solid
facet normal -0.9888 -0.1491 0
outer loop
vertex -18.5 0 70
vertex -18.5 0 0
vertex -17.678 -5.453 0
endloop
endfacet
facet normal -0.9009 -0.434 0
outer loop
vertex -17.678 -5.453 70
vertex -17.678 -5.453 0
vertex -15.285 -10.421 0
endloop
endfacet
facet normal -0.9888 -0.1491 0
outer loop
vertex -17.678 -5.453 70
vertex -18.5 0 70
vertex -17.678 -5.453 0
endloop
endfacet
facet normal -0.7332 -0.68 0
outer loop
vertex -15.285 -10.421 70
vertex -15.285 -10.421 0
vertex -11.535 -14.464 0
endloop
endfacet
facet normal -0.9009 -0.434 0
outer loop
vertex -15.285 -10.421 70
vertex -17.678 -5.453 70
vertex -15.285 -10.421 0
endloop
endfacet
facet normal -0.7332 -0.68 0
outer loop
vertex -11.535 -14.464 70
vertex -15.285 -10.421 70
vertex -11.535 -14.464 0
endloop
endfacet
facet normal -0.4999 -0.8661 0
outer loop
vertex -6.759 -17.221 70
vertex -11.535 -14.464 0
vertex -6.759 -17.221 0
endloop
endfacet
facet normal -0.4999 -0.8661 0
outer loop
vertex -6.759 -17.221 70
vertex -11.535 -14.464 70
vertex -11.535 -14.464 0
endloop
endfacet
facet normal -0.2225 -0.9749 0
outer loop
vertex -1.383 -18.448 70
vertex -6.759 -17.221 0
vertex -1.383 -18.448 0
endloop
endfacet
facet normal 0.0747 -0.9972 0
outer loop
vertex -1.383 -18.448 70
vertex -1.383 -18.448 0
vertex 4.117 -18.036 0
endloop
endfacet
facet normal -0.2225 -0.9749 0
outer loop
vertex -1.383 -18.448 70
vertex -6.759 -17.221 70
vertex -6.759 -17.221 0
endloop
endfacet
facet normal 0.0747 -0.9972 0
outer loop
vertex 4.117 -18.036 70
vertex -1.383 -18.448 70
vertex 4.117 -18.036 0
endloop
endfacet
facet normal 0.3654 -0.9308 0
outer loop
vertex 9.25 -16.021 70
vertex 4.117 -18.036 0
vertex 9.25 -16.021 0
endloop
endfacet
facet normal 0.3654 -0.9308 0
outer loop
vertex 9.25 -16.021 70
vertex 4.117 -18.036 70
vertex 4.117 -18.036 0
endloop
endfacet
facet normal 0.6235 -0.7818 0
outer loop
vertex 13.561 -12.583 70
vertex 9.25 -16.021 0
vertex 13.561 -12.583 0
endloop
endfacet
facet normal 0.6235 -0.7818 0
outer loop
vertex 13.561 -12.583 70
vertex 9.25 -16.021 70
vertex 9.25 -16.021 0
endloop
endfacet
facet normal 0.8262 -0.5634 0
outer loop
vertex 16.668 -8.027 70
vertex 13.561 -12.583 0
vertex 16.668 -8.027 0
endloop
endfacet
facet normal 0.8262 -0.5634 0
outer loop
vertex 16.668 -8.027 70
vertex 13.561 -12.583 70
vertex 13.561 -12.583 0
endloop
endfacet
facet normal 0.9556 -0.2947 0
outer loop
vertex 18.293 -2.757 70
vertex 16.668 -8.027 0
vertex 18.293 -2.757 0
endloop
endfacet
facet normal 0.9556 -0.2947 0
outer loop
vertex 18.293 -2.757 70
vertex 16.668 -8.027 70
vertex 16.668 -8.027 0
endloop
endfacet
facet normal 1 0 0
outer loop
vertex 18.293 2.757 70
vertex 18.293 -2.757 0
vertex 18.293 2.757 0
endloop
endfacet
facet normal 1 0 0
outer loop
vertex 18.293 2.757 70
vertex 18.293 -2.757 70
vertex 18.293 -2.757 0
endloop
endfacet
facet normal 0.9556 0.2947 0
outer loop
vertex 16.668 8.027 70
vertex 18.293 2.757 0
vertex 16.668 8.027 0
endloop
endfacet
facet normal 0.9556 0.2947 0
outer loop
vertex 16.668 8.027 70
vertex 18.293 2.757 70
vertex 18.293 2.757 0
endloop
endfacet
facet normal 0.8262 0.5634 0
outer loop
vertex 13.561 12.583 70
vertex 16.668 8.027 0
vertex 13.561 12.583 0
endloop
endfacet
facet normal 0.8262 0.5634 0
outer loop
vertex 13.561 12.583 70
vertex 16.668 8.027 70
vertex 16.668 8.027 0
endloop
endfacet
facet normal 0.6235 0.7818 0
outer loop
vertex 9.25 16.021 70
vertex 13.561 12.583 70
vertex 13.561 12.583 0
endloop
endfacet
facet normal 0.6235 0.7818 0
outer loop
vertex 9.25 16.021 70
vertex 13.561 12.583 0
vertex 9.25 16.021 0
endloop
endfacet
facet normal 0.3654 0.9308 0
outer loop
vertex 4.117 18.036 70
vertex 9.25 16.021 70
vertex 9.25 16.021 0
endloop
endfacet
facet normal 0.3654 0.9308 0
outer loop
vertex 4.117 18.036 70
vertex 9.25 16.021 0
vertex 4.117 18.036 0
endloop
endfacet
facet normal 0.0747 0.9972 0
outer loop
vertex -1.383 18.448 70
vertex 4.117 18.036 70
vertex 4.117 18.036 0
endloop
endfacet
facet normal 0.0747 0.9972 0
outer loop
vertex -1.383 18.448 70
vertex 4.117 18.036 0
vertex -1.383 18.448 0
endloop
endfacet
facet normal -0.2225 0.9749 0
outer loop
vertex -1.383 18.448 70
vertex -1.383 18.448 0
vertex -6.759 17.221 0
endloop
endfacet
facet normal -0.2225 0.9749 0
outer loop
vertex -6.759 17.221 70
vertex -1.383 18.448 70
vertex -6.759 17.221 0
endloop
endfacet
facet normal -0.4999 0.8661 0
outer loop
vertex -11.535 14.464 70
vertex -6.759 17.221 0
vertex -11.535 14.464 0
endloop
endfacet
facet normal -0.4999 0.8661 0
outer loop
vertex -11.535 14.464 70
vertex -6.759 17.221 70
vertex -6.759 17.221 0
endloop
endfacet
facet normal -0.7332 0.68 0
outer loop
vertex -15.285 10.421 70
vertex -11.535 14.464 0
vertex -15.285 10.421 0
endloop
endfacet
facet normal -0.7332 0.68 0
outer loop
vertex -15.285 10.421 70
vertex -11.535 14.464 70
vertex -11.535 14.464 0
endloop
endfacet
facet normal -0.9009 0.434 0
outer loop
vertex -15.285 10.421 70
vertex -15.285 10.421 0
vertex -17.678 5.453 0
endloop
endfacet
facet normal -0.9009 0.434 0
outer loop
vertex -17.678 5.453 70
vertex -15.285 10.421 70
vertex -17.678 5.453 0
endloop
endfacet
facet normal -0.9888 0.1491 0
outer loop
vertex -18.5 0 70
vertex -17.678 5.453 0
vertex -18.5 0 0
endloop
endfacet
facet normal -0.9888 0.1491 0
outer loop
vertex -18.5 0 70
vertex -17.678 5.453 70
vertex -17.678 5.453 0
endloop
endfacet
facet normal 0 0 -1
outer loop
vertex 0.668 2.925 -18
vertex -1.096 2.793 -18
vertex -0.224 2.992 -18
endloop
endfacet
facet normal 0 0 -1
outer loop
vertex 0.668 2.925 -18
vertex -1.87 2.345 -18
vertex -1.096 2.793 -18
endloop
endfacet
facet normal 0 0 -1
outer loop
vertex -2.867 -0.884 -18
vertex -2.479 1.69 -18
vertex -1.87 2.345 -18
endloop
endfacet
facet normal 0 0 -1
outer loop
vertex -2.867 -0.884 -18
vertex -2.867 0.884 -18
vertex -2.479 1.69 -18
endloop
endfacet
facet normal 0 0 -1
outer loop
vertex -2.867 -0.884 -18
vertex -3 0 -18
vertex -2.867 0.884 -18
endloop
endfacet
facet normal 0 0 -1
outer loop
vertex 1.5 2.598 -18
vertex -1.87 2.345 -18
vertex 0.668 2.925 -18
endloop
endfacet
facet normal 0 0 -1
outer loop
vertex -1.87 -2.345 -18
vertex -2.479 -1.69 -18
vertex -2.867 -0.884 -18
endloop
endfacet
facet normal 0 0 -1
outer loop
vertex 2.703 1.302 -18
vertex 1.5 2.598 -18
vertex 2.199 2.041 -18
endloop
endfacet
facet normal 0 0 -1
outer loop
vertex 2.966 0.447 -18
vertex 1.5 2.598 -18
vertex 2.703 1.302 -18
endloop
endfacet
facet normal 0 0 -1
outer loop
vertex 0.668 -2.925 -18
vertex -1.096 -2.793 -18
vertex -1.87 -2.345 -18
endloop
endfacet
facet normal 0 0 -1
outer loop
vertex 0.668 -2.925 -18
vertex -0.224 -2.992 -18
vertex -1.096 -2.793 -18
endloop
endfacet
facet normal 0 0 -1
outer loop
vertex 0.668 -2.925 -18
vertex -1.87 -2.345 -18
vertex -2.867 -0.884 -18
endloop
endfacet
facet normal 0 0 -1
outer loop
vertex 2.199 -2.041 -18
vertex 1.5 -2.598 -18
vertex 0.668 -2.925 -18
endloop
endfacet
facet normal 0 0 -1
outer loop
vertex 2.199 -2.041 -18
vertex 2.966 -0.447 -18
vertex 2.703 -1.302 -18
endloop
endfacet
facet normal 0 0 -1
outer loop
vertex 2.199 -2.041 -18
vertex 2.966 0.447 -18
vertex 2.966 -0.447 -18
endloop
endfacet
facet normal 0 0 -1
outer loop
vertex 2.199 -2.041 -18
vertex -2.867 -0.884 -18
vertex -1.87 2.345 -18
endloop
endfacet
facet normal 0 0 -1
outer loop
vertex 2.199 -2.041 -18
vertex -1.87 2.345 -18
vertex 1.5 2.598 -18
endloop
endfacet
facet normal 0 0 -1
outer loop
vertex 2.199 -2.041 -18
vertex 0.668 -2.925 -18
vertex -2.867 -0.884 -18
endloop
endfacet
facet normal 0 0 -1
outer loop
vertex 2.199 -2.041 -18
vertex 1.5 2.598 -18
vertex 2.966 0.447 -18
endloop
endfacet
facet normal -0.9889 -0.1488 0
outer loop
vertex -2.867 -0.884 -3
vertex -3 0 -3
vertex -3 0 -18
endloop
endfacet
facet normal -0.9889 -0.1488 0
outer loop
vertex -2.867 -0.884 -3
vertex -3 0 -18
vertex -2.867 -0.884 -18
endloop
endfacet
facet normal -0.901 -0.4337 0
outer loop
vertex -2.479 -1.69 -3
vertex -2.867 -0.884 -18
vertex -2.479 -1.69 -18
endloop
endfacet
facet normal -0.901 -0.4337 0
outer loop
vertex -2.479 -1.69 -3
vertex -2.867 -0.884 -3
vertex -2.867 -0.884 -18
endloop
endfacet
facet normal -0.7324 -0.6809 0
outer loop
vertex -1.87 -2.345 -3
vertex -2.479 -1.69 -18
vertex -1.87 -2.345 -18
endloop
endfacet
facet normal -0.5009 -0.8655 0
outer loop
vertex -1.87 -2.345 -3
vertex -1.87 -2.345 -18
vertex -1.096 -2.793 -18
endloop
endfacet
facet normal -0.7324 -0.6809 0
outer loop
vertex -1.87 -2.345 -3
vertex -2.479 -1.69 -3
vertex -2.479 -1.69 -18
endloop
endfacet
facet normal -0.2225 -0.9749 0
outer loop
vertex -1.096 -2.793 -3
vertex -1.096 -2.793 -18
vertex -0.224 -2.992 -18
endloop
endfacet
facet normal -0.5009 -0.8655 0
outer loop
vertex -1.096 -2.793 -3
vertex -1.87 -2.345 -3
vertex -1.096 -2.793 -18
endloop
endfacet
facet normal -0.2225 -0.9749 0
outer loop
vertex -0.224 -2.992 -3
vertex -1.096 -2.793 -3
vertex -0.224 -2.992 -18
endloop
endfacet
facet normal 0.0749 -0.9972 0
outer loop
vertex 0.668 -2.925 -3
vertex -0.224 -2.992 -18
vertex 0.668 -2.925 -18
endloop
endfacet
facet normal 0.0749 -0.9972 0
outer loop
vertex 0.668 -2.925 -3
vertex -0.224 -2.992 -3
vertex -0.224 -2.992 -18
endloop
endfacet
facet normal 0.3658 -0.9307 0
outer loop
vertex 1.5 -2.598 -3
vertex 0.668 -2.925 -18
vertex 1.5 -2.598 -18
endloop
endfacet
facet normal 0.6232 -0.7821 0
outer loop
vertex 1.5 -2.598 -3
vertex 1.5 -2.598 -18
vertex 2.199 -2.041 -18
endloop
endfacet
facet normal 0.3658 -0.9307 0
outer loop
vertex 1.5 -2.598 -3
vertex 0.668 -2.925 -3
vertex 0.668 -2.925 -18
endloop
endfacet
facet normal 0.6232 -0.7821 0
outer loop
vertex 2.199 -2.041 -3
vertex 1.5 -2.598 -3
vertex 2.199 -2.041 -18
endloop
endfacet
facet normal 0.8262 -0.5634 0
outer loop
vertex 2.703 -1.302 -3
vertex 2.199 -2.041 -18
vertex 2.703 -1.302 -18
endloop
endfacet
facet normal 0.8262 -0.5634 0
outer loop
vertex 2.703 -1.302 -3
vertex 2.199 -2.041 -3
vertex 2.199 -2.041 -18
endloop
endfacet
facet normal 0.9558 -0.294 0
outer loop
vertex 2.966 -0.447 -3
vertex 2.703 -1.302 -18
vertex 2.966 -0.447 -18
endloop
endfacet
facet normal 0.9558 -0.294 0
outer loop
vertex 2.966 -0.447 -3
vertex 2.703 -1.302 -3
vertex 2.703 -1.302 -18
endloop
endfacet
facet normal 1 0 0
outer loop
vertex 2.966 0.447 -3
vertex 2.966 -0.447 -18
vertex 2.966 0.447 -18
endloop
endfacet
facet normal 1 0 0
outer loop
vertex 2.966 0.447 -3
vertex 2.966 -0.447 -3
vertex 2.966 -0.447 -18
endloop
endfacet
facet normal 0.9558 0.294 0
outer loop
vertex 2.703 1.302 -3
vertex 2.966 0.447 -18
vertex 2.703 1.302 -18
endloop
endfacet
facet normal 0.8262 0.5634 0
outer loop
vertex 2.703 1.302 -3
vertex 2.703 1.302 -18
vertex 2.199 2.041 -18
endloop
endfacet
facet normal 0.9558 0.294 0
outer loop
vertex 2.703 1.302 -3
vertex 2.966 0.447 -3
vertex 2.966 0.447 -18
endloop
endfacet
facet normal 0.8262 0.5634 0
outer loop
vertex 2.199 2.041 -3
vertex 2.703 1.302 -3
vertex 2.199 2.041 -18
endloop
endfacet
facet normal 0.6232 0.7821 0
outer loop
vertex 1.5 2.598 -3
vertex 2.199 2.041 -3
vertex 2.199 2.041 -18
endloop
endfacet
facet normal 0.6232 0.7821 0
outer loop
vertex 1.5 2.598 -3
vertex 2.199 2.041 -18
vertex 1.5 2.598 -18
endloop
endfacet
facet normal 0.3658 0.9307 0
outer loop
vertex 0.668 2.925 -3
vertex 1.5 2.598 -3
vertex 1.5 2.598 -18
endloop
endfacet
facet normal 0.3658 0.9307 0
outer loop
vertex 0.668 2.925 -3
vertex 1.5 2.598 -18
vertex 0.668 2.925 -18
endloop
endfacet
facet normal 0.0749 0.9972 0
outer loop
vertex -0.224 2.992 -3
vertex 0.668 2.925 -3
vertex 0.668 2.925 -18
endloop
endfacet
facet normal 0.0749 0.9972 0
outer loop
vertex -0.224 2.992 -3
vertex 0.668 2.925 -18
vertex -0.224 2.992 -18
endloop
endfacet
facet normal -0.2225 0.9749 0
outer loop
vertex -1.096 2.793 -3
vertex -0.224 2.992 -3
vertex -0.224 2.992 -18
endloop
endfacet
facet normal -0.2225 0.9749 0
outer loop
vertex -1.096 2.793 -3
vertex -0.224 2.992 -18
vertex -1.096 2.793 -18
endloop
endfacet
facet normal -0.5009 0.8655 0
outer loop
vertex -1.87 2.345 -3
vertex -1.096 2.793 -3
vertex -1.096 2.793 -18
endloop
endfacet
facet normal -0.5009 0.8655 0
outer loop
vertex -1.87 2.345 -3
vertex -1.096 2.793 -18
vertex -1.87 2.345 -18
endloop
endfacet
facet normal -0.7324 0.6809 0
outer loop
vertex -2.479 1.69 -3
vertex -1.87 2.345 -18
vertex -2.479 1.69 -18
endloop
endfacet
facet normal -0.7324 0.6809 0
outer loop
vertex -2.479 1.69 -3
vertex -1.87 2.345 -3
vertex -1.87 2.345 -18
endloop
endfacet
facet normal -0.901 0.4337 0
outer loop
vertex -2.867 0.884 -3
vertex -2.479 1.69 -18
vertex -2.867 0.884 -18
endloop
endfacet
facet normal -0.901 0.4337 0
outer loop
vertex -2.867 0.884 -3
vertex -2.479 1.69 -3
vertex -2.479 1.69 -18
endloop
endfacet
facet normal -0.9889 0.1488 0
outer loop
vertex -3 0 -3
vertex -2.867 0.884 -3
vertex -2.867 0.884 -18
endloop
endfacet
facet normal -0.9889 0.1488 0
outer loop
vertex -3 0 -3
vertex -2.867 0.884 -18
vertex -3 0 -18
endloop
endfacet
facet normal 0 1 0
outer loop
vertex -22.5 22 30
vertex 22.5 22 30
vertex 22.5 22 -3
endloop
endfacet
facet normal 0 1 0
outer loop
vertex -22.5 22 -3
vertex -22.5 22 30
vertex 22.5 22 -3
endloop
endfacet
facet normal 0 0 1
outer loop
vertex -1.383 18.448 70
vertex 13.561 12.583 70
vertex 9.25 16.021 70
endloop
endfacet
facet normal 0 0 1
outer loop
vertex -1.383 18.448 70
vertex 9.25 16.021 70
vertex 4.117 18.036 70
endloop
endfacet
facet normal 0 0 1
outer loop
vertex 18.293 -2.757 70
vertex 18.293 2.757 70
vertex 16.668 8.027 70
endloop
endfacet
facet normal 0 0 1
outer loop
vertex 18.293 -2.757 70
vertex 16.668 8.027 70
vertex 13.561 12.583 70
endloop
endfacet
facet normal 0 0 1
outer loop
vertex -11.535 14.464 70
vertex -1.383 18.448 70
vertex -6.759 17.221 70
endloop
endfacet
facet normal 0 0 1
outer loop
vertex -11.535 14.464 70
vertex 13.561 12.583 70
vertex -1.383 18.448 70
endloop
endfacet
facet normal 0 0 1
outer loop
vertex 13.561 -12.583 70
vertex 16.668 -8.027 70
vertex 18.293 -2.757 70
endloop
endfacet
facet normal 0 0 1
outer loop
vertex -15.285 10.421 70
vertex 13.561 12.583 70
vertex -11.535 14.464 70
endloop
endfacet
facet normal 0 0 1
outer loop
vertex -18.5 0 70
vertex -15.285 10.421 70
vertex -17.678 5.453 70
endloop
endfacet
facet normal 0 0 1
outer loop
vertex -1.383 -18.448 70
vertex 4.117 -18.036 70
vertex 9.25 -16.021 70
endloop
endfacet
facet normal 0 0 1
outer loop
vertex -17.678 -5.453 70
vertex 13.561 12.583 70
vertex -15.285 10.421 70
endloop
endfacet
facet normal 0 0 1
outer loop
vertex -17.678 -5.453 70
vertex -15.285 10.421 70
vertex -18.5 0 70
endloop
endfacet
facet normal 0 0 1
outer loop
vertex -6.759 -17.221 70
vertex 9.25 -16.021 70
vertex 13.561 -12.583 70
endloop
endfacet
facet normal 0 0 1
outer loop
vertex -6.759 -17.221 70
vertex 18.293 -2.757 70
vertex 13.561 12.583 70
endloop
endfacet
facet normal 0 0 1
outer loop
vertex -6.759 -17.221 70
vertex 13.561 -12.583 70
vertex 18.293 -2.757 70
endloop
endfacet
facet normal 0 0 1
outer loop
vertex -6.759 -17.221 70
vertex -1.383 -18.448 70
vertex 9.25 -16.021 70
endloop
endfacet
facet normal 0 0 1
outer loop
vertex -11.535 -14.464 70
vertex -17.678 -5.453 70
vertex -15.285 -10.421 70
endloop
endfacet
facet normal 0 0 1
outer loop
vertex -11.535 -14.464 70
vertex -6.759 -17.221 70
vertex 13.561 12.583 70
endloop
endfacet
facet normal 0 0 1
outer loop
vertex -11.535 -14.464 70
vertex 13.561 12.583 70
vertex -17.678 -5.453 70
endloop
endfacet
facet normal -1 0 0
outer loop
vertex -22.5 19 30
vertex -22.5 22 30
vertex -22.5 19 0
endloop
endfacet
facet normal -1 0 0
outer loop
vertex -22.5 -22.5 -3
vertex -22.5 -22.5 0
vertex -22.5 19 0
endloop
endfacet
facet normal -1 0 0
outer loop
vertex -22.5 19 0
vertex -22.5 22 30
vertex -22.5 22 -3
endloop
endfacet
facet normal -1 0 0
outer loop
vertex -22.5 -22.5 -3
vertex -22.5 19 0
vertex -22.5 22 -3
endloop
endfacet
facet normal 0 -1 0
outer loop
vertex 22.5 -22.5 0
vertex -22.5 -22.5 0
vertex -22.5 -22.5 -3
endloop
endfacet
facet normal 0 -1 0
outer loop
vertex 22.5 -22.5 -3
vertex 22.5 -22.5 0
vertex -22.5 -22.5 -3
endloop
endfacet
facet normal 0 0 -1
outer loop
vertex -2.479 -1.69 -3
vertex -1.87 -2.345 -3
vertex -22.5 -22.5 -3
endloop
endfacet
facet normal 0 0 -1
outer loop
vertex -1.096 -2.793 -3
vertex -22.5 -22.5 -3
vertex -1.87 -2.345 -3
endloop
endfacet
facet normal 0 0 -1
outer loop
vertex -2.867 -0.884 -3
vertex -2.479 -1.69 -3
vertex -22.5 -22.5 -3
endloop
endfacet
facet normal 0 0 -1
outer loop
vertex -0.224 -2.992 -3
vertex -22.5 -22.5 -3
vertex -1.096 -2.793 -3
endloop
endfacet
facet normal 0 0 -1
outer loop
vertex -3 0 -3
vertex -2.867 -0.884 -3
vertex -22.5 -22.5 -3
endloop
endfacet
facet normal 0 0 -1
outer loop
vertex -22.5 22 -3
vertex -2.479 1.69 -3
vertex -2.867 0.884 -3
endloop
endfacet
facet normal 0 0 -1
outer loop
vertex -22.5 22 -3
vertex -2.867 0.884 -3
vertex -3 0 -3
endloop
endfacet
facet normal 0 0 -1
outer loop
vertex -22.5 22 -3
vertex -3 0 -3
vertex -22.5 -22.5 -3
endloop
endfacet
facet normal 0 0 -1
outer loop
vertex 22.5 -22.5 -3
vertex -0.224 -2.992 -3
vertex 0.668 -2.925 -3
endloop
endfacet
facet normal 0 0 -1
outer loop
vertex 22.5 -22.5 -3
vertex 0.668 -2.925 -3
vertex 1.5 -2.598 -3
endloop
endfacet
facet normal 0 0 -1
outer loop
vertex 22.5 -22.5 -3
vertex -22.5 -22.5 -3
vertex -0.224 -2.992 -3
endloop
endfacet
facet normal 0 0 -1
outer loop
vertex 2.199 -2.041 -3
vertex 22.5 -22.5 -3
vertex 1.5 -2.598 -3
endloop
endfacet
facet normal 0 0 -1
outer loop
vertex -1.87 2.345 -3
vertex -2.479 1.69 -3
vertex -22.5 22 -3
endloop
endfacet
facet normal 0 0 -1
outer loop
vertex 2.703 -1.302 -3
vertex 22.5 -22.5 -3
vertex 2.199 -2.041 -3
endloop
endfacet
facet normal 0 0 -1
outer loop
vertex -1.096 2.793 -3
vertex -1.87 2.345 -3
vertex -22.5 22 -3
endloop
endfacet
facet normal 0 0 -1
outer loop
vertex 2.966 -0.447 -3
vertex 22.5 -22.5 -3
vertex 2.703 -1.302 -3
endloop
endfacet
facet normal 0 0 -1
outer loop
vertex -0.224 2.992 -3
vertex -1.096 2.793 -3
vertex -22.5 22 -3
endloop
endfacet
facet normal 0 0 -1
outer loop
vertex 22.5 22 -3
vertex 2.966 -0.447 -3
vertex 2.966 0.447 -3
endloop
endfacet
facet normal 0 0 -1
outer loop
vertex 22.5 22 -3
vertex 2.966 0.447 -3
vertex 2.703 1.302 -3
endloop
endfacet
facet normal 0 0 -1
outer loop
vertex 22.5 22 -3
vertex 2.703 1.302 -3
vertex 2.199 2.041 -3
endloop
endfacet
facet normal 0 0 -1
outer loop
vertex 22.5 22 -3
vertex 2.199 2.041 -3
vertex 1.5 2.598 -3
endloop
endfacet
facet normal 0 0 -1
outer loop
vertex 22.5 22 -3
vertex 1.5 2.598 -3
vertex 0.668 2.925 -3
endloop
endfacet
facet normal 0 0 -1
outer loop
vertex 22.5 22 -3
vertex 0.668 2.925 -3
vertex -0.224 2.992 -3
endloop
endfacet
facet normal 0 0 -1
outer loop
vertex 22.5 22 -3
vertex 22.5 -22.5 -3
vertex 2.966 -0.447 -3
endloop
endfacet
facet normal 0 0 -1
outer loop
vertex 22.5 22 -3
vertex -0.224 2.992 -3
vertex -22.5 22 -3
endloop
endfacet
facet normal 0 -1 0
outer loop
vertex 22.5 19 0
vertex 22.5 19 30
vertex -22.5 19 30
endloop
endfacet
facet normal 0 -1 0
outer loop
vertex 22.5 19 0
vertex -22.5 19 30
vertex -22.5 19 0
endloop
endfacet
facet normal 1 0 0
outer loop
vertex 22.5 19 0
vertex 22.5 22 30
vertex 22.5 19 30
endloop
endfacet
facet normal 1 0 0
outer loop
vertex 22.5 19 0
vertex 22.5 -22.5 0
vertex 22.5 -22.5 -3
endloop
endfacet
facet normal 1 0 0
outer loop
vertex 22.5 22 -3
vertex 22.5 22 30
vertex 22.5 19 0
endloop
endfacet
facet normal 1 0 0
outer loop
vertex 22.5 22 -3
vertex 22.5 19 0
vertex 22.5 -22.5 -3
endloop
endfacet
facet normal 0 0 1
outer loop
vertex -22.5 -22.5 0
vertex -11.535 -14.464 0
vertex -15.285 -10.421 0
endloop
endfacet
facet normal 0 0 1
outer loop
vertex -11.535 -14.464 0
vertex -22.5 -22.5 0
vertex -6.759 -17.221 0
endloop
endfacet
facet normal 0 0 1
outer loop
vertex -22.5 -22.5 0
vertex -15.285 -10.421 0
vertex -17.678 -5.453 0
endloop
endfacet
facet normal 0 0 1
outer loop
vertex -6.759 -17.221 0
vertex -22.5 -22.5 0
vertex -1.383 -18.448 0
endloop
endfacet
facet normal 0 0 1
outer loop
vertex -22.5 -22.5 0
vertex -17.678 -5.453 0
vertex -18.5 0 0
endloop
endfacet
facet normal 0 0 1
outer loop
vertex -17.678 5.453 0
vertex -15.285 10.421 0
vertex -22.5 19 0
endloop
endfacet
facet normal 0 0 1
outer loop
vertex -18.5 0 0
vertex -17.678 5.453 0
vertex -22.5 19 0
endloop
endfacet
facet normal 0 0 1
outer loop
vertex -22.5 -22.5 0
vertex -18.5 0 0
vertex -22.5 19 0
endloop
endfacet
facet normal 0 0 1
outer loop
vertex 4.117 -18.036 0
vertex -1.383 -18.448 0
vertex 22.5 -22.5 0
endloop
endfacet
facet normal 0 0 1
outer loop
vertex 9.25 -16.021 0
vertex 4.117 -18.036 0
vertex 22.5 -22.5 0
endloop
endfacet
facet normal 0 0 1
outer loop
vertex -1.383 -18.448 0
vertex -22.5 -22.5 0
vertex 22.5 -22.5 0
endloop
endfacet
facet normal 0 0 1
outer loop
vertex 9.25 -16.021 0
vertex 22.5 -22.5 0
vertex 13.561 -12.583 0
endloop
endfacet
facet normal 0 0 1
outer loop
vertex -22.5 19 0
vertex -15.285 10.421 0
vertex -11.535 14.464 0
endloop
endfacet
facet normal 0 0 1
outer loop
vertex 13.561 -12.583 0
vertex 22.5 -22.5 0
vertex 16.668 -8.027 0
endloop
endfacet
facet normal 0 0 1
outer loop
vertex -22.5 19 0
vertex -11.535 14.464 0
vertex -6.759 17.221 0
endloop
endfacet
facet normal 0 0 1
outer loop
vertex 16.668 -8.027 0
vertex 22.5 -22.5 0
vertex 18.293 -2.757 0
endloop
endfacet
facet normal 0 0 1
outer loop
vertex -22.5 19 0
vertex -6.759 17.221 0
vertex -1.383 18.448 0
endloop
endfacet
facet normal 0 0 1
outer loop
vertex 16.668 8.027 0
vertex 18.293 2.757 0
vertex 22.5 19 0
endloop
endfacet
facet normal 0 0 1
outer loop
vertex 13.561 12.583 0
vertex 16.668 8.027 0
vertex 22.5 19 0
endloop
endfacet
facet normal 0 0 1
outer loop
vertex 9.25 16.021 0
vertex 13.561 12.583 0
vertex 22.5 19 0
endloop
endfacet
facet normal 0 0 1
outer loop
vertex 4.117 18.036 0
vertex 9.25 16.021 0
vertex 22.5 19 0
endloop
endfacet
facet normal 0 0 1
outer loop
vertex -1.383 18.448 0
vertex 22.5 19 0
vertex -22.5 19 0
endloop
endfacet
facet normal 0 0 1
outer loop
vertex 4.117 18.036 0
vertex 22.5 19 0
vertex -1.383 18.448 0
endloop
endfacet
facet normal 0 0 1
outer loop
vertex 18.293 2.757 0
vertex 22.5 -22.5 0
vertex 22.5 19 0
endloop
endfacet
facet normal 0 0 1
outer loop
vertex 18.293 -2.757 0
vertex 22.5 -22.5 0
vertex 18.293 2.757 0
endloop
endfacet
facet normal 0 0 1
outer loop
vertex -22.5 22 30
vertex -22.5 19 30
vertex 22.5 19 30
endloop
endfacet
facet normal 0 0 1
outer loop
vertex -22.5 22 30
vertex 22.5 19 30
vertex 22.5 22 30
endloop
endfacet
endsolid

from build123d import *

# Parameters (mm, degrees)
SK_BRACKET_FACE_W  = 3
SK_BRACKET_FACE_H  = 44.5
BRACKET_FACE_DEPTH = 22.5
SK_BRACKET_TOP_W   = 33
SK_BRACKET_TOP_H   = 3
BRACKET_TOP_DEPTH  = 22.5


with BuildPart() as part:
    # SK_Gearmotor → Gearmotor (revolve)
    with BuildSketch(Plane(origin=(0, 0, 0), x_dir=(1, 0, 0), z_dir=(0, 1, 0)), mode=Mode.PRIVATE) as gearmotor_sk:
        Polygon((0, 18), (3, 18), (3, 0), (18.5, 0), (18.5, -70), (0, -70), align=None)
    revolve(gearmotor_sk.sketch.rotate(Axis((0, 0, -23), (0, 0, 1)), 180), axis=Axis((0, 0, -23), (0, 0, 1)))

    # SK_Bracket_Face → Bracket_Face (add, symmetric)
    with BuildSketch(Plane(origin=(0, 0, 0), x_dir=(0, 0, -1), z_dir=(1, 0, 0))):
        with Locations((1.5, -0.25)):
            Rectangle(SK_BRACKET_FACE_W, SK_BRACKET_FACE_H)
    extrude(amount=BRACKET_FACE_DEPTH, both=True)

    # SK_Bracket_Top → Bracket_Top (add, symmetric)
    with BuildSketch(Plane(origin=(0, 0, 0), x_dir=(0, 0, -1), z_dir=(1, 0, 0))):
        with Locations((-13.5, 20.5)):
            Rectangle(SK_BRACKET_TOP_W, SK_BRACKET_TOP_H)
    extrude(amount=BRACKET_TOP_DEPTH, both=True)


solid = part.part
